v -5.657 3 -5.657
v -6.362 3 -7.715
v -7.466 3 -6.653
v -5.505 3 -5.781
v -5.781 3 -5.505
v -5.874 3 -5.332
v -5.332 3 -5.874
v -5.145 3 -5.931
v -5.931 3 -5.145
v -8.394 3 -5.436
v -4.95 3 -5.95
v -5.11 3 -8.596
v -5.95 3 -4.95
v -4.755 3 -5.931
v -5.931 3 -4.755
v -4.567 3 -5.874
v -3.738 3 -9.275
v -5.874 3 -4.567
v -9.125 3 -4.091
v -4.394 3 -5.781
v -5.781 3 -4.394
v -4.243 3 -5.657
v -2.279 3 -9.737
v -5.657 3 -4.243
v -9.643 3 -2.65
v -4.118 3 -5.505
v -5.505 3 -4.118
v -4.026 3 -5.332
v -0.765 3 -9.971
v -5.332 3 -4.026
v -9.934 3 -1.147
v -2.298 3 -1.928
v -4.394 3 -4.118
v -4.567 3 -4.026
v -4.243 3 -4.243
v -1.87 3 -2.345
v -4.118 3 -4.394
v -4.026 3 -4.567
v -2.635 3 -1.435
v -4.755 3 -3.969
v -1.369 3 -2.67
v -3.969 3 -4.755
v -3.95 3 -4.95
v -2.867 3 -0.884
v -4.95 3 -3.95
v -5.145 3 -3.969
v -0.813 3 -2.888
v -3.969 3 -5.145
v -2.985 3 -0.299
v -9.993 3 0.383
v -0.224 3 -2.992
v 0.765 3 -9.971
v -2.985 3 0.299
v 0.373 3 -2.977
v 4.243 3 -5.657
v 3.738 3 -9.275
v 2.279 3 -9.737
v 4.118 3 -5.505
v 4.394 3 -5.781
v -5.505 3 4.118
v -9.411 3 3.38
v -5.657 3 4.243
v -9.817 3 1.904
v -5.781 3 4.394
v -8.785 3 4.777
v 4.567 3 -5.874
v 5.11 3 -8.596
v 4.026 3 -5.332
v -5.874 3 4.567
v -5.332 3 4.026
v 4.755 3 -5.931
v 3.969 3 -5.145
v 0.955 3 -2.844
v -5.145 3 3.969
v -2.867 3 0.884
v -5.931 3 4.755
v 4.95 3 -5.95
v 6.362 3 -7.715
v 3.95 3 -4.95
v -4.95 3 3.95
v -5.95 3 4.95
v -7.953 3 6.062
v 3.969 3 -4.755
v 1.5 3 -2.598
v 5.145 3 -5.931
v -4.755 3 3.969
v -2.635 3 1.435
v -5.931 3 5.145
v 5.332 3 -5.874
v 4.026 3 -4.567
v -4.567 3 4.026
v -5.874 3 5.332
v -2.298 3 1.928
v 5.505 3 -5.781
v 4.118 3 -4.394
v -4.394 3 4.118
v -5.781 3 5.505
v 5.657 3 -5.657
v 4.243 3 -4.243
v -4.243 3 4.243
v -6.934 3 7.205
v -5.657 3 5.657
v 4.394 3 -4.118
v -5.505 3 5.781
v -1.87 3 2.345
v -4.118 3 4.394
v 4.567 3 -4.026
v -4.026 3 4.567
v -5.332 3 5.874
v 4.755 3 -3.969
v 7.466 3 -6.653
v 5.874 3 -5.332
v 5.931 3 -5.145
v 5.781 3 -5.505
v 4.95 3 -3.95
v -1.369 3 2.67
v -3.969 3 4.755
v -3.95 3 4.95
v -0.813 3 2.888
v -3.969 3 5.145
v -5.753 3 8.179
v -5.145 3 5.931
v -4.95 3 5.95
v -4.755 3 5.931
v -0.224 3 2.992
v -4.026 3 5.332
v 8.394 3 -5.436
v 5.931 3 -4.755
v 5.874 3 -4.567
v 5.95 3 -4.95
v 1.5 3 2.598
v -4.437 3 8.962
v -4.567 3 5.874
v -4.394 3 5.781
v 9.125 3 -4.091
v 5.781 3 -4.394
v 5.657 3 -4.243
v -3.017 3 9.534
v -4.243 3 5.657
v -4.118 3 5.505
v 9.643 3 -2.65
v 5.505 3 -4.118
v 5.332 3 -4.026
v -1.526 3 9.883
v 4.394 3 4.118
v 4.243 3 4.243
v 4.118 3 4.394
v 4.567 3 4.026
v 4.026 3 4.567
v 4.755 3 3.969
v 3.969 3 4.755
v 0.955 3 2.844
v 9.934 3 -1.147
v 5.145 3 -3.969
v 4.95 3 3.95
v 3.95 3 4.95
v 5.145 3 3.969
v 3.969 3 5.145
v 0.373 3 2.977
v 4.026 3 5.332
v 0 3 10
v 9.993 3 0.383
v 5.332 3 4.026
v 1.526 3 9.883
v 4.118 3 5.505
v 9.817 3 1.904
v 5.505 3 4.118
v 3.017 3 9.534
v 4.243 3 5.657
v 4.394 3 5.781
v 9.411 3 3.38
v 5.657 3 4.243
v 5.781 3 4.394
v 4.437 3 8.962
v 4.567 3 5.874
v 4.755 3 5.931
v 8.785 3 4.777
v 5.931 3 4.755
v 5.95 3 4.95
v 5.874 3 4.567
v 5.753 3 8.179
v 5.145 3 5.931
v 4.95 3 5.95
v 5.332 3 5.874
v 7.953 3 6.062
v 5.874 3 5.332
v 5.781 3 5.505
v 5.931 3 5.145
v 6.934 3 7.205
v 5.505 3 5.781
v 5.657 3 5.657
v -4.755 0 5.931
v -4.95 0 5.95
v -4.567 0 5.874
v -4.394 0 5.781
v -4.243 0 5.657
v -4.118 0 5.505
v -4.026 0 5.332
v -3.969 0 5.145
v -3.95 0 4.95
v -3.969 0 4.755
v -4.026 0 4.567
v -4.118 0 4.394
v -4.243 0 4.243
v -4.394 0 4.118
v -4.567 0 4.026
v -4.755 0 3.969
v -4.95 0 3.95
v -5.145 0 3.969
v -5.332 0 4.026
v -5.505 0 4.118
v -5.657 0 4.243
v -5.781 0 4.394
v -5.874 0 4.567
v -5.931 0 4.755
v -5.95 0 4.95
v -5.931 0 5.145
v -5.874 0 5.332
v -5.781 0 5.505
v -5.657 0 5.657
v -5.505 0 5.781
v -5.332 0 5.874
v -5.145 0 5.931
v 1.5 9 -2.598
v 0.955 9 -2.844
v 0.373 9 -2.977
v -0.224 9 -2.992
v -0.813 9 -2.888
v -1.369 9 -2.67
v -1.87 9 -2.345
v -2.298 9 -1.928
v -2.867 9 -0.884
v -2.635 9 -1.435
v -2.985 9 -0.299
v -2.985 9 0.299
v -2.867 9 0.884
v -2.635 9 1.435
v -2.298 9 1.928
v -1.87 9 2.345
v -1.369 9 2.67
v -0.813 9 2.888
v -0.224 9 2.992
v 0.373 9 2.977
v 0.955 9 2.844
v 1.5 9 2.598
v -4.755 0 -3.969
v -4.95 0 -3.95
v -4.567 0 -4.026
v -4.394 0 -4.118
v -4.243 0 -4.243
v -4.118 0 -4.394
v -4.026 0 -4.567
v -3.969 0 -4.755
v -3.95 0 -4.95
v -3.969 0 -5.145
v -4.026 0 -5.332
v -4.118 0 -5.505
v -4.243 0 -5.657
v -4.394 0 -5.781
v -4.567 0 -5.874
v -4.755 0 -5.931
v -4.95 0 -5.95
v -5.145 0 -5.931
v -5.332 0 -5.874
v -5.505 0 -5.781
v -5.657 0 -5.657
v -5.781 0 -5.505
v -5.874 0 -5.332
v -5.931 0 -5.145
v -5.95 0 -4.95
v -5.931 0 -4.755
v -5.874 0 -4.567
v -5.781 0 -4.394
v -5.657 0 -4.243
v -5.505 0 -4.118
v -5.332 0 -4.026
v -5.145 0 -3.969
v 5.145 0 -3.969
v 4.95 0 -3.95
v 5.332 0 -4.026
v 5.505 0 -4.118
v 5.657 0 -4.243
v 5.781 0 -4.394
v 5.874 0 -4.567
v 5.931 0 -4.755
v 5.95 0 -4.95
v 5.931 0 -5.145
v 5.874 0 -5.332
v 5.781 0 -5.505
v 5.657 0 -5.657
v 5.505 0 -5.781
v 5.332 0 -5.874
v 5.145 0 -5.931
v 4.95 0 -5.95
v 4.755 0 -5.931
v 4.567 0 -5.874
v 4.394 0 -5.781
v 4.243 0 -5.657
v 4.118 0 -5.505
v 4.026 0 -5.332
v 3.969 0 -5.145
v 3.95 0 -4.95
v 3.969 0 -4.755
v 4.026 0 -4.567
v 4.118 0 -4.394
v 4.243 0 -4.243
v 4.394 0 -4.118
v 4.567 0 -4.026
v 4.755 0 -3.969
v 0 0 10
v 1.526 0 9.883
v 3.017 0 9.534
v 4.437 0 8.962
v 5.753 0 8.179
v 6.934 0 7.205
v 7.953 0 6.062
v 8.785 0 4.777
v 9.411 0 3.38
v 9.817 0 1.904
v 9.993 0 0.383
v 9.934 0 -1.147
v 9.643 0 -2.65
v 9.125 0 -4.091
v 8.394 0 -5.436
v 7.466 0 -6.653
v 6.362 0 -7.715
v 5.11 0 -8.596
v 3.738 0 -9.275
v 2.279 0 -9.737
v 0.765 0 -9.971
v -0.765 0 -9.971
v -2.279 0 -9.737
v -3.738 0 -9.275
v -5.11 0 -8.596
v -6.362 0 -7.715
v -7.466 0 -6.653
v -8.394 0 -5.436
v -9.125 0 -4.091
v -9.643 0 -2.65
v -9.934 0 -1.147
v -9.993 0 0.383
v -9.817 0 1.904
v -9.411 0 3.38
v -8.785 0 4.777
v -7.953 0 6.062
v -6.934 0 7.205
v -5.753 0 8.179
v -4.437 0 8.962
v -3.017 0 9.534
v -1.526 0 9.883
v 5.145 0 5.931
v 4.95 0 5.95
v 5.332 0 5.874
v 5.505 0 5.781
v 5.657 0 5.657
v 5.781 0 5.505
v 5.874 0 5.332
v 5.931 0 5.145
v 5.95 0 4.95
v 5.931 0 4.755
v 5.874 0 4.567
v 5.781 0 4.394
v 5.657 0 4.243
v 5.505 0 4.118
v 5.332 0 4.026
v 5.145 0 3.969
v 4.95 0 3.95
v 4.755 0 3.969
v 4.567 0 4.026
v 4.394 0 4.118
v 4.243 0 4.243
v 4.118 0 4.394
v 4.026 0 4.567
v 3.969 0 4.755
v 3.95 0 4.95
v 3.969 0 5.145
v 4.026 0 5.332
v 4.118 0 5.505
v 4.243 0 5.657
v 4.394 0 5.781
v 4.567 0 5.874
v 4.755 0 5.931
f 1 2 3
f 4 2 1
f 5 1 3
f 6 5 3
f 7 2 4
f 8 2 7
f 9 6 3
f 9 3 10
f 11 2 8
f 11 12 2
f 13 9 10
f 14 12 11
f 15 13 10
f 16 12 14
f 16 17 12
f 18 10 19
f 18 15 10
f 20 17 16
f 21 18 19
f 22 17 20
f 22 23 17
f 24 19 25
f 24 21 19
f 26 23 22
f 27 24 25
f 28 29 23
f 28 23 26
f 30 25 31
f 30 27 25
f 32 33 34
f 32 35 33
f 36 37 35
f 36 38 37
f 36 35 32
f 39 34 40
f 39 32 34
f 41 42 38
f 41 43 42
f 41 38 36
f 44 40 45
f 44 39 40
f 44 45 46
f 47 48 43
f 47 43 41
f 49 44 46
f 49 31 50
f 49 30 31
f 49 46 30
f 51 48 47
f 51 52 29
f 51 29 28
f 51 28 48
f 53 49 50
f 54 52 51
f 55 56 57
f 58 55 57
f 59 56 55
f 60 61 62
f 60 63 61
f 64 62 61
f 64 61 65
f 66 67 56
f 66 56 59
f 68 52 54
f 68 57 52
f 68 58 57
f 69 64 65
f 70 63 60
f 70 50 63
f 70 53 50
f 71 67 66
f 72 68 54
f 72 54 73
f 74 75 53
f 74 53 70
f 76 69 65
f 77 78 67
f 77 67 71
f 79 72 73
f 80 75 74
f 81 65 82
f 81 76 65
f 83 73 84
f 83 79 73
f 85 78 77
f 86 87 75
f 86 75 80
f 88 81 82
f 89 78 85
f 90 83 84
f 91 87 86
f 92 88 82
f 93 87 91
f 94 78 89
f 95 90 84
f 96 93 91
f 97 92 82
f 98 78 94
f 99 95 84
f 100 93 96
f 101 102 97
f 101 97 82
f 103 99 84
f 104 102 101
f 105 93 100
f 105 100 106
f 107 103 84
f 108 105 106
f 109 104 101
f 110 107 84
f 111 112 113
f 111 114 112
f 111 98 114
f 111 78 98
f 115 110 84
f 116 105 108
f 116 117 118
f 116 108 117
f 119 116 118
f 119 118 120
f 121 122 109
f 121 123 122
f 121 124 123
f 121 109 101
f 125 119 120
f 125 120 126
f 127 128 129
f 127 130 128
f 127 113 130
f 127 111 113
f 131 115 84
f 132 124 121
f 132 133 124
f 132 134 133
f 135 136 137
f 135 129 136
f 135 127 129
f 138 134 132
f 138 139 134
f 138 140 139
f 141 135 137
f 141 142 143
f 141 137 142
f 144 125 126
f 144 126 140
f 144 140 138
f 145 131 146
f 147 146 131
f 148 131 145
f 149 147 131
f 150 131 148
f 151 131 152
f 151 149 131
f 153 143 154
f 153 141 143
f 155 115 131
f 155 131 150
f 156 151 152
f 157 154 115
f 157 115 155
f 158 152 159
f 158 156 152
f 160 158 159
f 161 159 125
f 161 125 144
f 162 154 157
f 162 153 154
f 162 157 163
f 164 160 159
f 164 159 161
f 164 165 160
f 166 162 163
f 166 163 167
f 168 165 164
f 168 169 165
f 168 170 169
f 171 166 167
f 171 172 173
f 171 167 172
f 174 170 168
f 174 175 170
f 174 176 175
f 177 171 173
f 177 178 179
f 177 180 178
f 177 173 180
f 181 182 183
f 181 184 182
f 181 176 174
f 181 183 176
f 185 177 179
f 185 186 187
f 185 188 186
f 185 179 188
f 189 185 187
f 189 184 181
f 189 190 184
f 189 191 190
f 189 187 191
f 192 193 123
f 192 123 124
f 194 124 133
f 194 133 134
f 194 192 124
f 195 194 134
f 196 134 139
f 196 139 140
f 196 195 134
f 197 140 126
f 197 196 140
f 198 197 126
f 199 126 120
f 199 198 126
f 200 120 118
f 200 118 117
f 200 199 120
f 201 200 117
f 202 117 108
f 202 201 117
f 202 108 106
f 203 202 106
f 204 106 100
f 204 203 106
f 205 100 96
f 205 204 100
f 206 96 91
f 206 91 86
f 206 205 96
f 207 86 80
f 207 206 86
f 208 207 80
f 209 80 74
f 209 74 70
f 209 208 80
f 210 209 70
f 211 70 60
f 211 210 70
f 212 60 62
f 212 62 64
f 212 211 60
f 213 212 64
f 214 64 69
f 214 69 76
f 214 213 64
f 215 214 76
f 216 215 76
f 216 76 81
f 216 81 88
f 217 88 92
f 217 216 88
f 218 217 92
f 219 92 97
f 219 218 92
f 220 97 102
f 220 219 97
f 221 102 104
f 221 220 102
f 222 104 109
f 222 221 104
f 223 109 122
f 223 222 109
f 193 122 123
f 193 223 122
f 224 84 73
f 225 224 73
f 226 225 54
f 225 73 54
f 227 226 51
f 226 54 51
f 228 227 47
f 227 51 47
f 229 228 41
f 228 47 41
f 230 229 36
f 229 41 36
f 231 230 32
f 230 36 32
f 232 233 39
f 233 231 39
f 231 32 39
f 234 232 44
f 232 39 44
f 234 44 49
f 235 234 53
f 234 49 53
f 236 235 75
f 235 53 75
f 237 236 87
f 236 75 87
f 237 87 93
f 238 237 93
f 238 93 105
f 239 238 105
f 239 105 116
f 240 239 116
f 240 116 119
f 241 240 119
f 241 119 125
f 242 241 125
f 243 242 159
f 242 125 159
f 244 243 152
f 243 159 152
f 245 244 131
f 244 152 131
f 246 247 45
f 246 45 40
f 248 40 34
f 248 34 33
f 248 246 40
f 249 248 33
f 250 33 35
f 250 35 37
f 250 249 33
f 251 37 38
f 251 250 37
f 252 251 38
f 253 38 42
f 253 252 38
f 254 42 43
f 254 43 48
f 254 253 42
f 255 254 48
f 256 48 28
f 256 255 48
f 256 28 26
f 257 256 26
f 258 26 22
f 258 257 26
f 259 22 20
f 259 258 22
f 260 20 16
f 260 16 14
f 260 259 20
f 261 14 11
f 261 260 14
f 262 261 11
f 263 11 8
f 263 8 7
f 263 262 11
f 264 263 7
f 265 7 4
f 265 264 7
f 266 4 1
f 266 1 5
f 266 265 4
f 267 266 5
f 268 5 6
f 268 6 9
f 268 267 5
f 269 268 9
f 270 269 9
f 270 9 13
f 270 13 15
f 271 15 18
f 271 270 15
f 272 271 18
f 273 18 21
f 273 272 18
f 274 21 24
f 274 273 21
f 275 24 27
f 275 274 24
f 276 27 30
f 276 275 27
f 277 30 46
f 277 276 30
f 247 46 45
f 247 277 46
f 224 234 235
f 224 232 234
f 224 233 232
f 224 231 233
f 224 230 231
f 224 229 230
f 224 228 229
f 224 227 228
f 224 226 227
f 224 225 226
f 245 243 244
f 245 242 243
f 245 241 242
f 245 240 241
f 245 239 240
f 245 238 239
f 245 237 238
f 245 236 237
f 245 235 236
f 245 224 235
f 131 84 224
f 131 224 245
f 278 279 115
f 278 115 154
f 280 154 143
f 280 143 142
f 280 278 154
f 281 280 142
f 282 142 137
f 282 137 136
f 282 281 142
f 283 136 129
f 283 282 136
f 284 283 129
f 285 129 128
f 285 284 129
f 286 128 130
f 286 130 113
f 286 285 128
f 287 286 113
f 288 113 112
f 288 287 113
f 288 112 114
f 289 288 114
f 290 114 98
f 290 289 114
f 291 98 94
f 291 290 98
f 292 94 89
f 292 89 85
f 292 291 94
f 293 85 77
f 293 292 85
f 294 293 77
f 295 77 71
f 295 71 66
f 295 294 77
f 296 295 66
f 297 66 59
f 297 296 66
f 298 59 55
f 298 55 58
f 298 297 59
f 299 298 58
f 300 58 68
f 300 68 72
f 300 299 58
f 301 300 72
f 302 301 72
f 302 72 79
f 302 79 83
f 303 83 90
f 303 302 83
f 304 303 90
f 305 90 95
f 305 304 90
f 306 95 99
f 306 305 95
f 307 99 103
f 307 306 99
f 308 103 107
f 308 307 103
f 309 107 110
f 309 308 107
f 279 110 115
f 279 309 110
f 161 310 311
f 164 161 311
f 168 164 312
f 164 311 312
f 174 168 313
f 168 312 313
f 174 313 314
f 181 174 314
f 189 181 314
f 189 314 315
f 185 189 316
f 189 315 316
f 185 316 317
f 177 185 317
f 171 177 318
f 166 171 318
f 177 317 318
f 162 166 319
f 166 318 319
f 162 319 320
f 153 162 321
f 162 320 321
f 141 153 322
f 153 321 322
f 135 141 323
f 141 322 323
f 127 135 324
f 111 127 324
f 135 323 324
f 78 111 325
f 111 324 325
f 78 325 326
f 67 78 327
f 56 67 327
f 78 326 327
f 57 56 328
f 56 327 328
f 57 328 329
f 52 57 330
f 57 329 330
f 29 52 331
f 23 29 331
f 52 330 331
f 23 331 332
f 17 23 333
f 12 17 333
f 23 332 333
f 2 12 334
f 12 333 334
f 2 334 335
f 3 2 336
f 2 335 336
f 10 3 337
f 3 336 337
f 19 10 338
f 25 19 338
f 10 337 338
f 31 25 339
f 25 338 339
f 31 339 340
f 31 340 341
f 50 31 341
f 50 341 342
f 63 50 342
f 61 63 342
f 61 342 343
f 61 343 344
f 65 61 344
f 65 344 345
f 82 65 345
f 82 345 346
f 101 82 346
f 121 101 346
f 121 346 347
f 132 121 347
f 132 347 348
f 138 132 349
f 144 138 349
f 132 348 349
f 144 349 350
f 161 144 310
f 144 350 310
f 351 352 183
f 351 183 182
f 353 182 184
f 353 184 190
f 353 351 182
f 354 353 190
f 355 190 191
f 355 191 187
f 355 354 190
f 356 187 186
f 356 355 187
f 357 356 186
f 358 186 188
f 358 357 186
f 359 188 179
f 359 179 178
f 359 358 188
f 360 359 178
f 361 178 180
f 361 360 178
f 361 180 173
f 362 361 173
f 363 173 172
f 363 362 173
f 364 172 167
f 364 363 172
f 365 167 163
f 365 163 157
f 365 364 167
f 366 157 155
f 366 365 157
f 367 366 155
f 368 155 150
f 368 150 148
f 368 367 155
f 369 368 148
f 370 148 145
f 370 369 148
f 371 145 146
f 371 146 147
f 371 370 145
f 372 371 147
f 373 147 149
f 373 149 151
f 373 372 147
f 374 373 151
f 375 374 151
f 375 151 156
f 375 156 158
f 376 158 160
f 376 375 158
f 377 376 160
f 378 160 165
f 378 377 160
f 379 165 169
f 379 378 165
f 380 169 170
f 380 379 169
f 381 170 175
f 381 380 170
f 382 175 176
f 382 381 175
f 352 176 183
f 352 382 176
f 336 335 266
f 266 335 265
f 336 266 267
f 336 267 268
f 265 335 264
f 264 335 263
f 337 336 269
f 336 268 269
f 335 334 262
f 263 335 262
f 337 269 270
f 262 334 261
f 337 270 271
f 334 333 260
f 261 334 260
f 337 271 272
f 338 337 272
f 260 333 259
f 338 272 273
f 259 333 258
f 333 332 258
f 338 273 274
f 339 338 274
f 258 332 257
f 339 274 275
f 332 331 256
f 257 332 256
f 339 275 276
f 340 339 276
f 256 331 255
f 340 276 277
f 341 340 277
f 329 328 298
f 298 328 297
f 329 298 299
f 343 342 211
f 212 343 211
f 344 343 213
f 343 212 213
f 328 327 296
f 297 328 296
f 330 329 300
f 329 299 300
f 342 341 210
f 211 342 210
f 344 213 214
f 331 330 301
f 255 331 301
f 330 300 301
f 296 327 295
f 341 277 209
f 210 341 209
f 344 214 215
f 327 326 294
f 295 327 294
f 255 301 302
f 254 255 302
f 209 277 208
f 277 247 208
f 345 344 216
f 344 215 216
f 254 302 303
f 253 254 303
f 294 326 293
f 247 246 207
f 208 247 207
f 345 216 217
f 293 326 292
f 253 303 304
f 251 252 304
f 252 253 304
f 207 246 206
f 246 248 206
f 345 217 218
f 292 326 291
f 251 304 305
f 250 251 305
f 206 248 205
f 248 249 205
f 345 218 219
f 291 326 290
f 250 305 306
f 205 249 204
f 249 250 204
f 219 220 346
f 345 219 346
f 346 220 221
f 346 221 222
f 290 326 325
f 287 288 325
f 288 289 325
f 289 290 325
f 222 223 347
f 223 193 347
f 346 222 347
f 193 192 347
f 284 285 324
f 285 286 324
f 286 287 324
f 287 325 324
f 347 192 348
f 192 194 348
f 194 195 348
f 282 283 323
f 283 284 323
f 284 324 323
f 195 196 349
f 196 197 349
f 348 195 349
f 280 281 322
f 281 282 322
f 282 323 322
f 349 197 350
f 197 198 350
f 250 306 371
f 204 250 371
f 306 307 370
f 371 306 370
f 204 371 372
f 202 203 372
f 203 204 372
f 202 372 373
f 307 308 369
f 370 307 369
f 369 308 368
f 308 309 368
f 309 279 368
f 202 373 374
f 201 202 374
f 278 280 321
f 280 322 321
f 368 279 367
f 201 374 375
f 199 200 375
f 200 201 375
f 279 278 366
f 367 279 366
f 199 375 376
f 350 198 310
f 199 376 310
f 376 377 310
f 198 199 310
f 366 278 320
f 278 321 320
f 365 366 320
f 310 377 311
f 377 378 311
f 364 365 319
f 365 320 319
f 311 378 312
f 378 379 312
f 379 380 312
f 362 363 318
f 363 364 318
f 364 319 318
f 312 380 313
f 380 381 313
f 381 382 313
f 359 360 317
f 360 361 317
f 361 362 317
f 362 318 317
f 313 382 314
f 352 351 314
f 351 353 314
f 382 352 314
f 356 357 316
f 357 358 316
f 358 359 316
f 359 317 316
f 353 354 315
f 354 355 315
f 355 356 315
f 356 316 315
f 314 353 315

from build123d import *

# Parameters (mm, degrees)
CROQUIS1_R              = 10
CROQUIS1_R_2            = 1
SALIENTE_EXTRUIR1_DEPTH = 3
SALIENTE_EXTRUIR2_START = 3
CROQUIS1_3_R            = 3
SALIENTE_EXTRUIR2_DEPTH = 6
CORTAR_EXTRUIR1_START   = -6
CORTAR_EXTRUIR1_DEPTH   = 6


with BuildPart() as part:
    # Croquis1 → Saliente-Extruir1 (new body)
    with BuildSketch(Plane(origin=(0, 0, 0), x_dir=(1, 0, 0), z_dir=(0, 1, 0))):
        with Locations(Location((0, 0, 0), (0, 0, 270))):
            Circle(CROQUIS1_R)
        with Locations(Location((-4.949747468, 4.949747468, 0), (0, 0, 270))):
            Circle(CROQUIS1_R_2, mode=Mode.SUBTRACT)
        with Locations(Location((4.949747468, 4.949747468, 0), (0, 0, 270))):
            Circle(CROQUIS1_R_2, mode=Mode.SUBTRACT)
        with Locations(Location((4.949747468, -4.949747468, 0), (0, 0, 270))):
            Circle(CROQUIS1_R_2, mode=Mode.SUBTRACT)
        with Locations(Location((-4.949747468, -4.949747468, 0), (0, 0, 270))):
            Circle(CROQUIS1_R_2, mode=Mode.SUBTRACT)
    extrude(amount=SALIENTE_EXTRUIR1_DEPTH)

    # Croquis1<3> → Saliente-Extruir2 (add)
    with BuildSketch(Plane(origin=(0, 0, 0), x_dir=(1, 0, 0), z_dir=(0, 1, 0)).offset(SALIENTE_EXTRUIR2_START)):
        with Locations(Location((0, 0, 0), (0, 0, 270))):
            Circle(CROQUIS1_3_R)
    extrude(amount=SALIENTE_EXTRUIR2_DEPTH)

    # Croquis2 → Cortar-Extruir1 (cut)
    with BuildSketch(Plane(origin=(0, 9, 0), x_dir=(1, 0, 0), z_dir=(0, 1, 0)).offset(CORTAR_EXTRUIR1_START)):
        with BuildLine():
            Line((1.5, 2.598076211), (1.5, -2.598076211))
            ThreePointArc((1.5, -2.598076211), (3, 0), (1.5, 2.598076211))
        make_face()
    extrude(amount=CORTAR_EXTRUIR1_DEPTH, mode=Mode.SUBTRACT)


solid = part.part
